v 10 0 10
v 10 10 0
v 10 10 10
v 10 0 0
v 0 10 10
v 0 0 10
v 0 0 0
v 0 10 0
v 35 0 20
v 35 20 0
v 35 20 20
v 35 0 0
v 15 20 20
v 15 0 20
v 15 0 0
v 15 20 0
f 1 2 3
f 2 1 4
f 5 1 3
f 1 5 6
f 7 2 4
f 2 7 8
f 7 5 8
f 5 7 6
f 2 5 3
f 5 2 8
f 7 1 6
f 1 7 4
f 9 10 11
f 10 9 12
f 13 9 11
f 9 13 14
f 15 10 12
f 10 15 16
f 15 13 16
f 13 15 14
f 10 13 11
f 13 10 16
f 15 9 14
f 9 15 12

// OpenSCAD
// Unit of length: Unit.MM
union()
{
   cube(size = 10.0, center = false);
   translate(v = [15.0, 0.0, 0.0])
   {
      scale(v = [2.0, 2.0, 2.0])
      {
         cube(size = 10.0, center = false);
      }
   }
}
